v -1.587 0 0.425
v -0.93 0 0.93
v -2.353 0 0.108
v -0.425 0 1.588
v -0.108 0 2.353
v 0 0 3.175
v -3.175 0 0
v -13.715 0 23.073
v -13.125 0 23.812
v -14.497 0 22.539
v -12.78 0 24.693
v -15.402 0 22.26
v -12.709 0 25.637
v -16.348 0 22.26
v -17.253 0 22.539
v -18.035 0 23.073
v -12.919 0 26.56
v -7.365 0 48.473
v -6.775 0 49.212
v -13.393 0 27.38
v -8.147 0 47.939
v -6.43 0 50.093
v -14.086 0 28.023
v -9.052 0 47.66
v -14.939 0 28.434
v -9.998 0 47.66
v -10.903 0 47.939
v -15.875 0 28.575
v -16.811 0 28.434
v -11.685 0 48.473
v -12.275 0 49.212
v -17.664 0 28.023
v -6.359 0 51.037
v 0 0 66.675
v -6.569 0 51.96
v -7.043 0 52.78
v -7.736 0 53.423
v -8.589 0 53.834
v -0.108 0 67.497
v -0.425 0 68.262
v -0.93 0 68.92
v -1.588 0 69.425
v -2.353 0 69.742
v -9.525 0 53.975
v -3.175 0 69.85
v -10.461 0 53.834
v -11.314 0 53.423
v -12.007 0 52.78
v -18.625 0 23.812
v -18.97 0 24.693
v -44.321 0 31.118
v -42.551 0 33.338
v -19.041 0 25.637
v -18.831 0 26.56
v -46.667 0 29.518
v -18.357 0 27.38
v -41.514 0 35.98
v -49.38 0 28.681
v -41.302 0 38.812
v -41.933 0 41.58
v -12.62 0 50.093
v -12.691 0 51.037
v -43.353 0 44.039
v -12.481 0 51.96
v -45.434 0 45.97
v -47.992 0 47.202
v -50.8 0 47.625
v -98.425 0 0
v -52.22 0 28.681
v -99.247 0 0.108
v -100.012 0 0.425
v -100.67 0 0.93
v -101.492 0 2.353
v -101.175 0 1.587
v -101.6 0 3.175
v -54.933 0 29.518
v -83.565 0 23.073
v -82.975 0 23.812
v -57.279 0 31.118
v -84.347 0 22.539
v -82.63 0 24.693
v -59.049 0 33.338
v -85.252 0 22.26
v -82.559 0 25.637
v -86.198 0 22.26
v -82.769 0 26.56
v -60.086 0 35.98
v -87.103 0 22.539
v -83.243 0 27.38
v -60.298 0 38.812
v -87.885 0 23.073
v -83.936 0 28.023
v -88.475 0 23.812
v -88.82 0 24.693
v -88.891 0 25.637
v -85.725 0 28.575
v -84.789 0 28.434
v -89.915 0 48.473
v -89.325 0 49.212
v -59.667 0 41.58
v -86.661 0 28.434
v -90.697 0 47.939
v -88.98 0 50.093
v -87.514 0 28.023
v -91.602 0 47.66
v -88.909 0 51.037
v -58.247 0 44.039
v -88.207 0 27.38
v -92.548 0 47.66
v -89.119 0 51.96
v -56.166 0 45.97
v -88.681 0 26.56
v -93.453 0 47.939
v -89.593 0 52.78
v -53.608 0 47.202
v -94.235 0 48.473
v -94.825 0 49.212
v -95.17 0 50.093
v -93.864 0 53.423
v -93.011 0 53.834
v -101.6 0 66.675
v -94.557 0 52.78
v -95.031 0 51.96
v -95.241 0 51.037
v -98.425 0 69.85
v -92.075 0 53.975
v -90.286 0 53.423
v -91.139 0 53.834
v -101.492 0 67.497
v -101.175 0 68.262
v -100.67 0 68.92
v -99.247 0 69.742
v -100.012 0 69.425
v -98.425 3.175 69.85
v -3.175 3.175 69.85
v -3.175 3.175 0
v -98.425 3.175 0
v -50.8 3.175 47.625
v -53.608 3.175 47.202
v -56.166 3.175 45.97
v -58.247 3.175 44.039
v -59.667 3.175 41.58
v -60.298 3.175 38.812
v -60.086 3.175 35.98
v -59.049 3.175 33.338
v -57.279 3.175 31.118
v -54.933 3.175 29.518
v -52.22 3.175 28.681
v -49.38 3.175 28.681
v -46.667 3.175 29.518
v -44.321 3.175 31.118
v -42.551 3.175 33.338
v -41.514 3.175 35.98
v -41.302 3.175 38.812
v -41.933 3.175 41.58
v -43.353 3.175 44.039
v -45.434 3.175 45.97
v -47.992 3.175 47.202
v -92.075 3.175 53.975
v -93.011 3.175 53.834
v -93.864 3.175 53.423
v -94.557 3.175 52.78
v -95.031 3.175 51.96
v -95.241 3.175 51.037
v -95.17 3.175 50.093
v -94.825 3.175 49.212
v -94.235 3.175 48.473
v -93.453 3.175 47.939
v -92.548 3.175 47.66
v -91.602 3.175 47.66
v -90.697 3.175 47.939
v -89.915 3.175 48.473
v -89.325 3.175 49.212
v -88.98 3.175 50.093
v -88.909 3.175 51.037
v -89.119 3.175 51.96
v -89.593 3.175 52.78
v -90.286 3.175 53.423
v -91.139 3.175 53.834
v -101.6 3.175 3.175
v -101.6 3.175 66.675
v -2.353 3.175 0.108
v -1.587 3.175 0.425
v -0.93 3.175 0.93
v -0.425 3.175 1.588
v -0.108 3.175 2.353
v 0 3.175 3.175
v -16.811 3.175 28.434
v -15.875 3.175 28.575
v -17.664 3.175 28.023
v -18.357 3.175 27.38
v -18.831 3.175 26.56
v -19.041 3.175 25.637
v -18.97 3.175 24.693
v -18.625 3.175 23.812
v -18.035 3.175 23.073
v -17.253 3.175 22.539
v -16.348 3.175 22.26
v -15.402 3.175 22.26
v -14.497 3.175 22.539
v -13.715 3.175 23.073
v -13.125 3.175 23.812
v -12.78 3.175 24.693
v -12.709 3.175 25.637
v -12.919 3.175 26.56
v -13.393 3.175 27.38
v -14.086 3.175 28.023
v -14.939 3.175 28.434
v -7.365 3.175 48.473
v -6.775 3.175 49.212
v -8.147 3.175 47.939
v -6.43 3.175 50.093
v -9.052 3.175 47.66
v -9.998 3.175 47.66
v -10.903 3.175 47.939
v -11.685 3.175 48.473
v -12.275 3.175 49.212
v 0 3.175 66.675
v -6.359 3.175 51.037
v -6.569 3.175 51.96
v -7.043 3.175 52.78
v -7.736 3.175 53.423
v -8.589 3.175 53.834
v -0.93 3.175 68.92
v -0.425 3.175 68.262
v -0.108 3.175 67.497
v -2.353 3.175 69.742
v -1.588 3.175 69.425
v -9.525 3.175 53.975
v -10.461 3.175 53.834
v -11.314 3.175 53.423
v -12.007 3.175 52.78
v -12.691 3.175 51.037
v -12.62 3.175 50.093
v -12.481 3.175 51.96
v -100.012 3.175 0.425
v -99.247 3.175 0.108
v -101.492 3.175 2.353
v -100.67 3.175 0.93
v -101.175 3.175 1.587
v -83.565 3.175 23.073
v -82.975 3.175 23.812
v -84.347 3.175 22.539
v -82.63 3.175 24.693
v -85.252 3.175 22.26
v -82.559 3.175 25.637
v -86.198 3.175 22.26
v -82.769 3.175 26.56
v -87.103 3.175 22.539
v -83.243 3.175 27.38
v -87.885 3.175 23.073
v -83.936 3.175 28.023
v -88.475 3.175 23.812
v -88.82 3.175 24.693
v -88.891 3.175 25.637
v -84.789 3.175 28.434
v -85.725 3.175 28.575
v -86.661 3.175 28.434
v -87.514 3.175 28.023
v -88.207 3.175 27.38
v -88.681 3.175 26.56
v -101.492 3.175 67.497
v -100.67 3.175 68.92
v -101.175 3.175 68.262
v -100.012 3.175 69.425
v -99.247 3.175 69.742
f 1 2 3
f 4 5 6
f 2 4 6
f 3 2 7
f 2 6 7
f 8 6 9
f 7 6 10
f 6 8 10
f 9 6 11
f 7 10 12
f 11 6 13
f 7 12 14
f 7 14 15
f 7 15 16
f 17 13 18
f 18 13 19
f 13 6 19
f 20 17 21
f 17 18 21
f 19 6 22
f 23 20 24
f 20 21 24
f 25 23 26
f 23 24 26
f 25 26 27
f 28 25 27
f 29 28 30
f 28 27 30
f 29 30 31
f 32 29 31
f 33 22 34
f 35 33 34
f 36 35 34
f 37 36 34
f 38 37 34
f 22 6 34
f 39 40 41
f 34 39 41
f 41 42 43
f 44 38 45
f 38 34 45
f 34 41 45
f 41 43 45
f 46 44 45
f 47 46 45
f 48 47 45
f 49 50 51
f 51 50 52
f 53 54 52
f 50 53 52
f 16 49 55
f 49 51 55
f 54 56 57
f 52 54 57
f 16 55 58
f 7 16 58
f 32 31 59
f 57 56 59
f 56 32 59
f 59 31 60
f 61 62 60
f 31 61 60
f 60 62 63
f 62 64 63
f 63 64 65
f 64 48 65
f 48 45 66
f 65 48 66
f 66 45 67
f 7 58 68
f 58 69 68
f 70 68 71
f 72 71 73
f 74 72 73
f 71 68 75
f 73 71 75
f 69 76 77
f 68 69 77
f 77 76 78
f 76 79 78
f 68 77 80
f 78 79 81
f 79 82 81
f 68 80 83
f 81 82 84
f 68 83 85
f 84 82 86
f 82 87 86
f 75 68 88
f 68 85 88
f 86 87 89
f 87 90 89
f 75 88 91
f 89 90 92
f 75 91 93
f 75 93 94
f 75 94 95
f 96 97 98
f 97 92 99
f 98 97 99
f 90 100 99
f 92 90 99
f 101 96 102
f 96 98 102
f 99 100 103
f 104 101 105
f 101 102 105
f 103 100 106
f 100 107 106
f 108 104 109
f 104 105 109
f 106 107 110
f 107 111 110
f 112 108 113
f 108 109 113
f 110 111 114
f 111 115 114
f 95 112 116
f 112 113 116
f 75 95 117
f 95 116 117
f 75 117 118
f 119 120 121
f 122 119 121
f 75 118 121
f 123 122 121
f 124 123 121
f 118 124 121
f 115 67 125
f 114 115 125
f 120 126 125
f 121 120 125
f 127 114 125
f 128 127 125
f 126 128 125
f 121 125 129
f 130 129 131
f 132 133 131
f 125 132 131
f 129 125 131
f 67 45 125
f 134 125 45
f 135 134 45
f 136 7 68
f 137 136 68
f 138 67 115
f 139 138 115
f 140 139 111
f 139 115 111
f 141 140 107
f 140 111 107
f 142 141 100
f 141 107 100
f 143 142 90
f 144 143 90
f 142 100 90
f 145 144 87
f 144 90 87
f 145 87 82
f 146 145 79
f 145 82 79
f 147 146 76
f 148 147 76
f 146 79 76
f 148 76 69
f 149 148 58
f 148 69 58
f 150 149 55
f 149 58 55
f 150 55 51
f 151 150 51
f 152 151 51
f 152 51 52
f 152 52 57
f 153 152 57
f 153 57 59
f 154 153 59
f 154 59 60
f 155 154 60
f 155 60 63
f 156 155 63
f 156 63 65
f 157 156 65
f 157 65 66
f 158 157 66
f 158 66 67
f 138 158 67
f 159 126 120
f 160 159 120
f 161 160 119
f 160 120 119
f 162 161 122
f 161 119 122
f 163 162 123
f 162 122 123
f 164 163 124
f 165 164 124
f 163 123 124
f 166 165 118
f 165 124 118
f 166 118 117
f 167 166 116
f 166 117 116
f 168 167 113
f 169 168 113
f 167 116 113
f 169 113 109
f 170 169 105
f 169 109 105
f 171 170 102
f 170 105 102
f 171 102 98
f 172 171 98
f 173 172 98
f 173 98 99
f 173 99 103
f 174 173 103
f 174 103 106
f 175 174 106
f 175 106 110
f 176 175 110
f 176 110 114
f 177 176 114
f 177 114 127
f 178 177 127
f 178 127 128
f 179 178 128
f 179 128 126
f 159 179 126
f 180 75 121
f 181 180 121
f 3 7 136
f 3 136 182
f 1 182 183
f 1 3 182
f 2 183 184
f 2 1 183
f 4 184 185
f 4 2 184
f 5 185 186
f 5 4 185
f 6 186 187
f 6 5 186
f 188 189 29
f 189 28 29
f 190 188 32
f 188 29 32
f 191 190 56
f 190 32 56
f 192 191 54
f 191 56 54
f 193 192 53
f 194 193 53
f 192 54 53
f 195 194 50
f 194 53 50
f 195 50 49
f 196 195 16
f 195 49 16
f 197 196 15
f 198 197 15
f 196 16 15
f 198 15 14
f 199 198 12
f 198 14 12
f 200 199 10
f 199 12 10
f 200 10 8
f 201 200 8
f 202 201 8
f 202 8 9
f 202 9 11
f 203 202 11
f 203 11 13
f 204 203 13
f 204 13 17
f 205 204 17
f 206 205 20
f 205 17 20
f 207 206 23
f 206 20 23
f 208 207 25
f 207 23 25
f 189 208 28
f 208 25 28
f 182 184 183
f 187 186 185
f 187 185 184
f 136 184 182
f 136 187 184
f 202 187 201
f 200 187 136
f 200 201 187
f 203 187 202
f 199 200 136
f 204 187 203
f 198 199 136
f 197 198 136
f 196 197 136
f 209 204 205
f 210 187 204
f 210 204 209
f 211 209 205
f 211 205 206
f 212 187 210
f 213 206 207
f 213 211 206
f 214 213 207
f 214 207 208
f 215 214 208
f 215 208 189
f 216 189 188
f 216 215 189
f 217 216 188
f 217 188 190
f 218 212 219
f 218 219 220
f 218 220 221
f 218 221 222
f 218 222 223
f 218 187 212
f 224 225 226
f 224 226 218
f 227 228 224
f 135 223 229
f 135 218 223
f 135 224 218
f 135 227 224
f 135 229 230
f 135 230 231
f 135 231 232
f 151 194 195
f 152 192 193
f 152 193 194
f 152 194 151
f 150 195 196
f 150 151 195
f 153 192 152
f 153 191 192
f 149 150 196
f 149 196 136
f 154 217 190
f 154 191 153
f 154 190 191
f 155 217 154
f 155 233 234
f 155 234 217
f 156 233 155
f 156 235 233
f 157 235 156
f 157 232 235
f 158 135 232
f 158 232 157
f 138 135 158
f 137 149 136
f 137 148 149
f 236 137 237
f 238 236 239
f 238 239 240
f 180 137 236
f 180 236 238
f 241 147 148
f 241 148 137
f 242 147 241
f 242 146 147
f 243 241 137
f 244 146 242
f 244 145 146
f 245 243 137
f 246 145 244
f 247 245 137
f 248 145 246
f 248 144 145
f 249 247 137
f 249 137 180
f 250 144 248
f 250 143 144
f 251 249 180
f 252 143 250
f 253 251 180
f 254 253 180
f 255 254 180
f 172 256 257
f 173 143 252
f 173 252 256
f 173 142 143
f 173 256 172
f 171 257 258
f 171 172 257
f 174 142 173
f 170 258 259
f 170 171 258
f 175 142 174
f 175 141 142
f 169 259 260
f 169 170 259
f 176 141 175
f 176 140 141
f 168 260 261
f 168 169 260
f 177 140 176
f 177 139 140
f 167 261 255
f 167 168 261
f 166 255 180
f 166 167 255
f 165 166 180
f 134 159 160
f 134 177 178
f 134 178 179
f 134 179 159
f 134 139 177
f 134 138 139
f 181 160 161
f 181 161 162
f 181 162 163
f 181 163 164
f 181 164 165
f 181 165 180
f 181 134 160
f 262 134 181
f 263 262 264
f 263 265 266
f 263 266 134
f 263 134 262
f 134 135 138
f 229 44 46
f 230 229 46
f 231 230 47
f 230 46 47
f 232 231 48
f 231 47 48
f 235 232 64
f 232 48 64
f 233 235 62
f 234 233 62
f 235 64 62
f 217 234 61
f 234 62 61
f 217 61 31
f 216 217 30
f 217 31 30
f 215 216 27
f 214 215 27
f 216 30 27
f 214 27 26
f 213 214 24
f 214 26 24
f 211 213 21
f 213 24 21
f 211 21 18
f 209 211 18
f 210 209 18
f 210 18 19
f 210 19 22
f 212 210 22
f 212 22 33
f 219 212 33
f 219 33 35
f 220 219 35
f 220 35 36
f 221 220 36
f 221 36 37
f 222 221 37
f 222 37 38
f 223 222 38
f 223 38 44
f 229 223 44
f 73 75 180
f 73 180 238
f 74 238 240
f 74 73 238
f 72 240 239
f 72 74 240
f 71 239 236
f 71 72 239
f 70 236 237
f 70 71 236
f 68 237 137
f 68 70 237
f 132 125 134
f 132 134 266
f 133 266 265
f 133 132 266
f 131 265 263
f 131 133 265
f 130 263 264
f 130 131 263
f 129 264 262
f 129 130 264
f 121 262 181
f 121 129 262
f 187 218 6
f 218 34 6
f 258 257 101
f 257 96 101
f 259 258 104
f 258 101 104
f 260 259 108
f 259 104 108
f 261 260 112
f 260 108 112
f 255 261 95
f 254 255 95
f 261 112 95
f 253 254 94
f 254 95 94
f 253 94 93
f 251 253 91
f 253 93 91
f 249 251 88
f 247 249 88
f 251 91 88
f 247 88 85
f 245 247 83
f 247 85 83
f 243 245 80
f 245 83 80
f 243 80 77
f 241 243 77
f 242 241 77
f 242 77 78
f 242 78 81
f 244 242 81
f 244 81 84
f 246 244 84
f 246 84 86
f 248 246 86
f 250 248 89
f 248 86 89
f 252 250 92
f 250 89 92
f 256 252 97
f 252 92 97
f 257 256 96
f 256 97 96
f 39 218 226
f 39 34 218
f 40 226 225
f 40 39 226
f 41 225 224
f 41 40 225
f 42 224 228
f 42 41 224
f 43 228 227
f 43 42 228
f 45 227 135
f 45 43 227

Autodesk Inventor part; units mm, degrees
ref_plane "YZ Plane" through (0, 0, 0) normal (1, 0, 0) x (0, 1, 0)
ref_plane "XZ Plane" through (0, 0, 0) normal (0, 1, 0) x (-1, 0, 0)
ref_plane "XY Plane" through (0, 0, 0) normal (0, 0, 1) x (1, 0, 0)
sketch "Sketch1" plane through (0, 0, 0) normal (0, 1, 0) x (-1, 0, 0)
  line L0 (3.175, 0) -> (98.425, 0)
  line L1 (101.6, 3.175) -> (101.6, 66.675)
  line L2 (98.425, 69.85) -> (3.175, 69.85)
  line L3 (0, 66.675) -> (0, 3.175)
  arc A0 (3.175, 69.85) -> (0, 66.675) centre (3.175, 66.675) ccw
  arc A1 (101.6, 66.675) -> (98.425, 69.85) centre (98.425, 66.675) ccw
  arc A2 (98.425, 0) -> (101.6, 3.175) centre (98.425, 3.175) ccw
  arc A3 (0, 3.175) -> (3.175, 0) centre (3.175, 3.175) ccw
  point P0 (0, 0)
  point P1 (101.6, 69.85)
  point P2 (101.6, 0)
  point P3 (0, 69.85)
  dimension "d0" = 101.6
  dimension "d1" = 69.85
  dimension "d13" = 3.175
extrude "Extrusion1" add sketch "Sketch1" along normal blind 3.175
sketch "Sketch2" plane through (0, 3.175, 0) normal (0, 1, 0) x (1, 0, 0)
  line L0 (-3.175, 0) -> (-98.425, 0) projected
  line L1 (-101.6, -3.175) -> (-101.6, -66.675) projected
  line L2 (0, -66.675) -> (0, -3.175) projected
  point P0 (0, 0)
  point P1 (-76.2, 0)
  point P2 (-76.2, -76.2)
  point P3 (-50.8, -38.1)
  dimension "d4" = 50.8
  dimension "d5" = 38.1
  dimension "d29" = 50.8
hole "Hole1" at (-50.8, 3.175, 38.1) direction (0, -1, 0) diameter 19.05 end through all
sketch "Sketch3" plane through (0, 3.175, 0) normal (0, 1, 0) x (1, 0, 0)
  line L0 (0, -66.675) -> (0, -3.175) projected
  line L1 (-101.6, -3.175) -> (-101.6, -66.675) projected
  circle A0 centre (-50.8, -38.1) radius 9.525 projected
  point P0 (0, 0)
  point P1 (-85.725, -25.4)
  point P2 (-15.875, -25.4)
  point P3 (-9.525, -50.8)
  point P4 (-92.075, -50.8)
  dimension "d30" = 6.35
  dimension "d33" = 25.4
  dimension "d36" = 9.525
  dimension "d37" = 9.525
  dimension "d38" = 6.35
  dimension "d39" = 12.7
  dimension "d40" = 82.55
hole "Hole2" at (-85.725, 3.175, 25.4) at (-15.875, 3.175, 25.4) at (-9.525, 3.175, 50.8) at (-92.075, 3.175, 50.8) direction (0, -1, 0) diameter 6.35 end through all
equation "\"d4\" = d29"
equation "\"d36\" = d37"
equation "\"d38\" = d30"
properties part number "motorMount"
